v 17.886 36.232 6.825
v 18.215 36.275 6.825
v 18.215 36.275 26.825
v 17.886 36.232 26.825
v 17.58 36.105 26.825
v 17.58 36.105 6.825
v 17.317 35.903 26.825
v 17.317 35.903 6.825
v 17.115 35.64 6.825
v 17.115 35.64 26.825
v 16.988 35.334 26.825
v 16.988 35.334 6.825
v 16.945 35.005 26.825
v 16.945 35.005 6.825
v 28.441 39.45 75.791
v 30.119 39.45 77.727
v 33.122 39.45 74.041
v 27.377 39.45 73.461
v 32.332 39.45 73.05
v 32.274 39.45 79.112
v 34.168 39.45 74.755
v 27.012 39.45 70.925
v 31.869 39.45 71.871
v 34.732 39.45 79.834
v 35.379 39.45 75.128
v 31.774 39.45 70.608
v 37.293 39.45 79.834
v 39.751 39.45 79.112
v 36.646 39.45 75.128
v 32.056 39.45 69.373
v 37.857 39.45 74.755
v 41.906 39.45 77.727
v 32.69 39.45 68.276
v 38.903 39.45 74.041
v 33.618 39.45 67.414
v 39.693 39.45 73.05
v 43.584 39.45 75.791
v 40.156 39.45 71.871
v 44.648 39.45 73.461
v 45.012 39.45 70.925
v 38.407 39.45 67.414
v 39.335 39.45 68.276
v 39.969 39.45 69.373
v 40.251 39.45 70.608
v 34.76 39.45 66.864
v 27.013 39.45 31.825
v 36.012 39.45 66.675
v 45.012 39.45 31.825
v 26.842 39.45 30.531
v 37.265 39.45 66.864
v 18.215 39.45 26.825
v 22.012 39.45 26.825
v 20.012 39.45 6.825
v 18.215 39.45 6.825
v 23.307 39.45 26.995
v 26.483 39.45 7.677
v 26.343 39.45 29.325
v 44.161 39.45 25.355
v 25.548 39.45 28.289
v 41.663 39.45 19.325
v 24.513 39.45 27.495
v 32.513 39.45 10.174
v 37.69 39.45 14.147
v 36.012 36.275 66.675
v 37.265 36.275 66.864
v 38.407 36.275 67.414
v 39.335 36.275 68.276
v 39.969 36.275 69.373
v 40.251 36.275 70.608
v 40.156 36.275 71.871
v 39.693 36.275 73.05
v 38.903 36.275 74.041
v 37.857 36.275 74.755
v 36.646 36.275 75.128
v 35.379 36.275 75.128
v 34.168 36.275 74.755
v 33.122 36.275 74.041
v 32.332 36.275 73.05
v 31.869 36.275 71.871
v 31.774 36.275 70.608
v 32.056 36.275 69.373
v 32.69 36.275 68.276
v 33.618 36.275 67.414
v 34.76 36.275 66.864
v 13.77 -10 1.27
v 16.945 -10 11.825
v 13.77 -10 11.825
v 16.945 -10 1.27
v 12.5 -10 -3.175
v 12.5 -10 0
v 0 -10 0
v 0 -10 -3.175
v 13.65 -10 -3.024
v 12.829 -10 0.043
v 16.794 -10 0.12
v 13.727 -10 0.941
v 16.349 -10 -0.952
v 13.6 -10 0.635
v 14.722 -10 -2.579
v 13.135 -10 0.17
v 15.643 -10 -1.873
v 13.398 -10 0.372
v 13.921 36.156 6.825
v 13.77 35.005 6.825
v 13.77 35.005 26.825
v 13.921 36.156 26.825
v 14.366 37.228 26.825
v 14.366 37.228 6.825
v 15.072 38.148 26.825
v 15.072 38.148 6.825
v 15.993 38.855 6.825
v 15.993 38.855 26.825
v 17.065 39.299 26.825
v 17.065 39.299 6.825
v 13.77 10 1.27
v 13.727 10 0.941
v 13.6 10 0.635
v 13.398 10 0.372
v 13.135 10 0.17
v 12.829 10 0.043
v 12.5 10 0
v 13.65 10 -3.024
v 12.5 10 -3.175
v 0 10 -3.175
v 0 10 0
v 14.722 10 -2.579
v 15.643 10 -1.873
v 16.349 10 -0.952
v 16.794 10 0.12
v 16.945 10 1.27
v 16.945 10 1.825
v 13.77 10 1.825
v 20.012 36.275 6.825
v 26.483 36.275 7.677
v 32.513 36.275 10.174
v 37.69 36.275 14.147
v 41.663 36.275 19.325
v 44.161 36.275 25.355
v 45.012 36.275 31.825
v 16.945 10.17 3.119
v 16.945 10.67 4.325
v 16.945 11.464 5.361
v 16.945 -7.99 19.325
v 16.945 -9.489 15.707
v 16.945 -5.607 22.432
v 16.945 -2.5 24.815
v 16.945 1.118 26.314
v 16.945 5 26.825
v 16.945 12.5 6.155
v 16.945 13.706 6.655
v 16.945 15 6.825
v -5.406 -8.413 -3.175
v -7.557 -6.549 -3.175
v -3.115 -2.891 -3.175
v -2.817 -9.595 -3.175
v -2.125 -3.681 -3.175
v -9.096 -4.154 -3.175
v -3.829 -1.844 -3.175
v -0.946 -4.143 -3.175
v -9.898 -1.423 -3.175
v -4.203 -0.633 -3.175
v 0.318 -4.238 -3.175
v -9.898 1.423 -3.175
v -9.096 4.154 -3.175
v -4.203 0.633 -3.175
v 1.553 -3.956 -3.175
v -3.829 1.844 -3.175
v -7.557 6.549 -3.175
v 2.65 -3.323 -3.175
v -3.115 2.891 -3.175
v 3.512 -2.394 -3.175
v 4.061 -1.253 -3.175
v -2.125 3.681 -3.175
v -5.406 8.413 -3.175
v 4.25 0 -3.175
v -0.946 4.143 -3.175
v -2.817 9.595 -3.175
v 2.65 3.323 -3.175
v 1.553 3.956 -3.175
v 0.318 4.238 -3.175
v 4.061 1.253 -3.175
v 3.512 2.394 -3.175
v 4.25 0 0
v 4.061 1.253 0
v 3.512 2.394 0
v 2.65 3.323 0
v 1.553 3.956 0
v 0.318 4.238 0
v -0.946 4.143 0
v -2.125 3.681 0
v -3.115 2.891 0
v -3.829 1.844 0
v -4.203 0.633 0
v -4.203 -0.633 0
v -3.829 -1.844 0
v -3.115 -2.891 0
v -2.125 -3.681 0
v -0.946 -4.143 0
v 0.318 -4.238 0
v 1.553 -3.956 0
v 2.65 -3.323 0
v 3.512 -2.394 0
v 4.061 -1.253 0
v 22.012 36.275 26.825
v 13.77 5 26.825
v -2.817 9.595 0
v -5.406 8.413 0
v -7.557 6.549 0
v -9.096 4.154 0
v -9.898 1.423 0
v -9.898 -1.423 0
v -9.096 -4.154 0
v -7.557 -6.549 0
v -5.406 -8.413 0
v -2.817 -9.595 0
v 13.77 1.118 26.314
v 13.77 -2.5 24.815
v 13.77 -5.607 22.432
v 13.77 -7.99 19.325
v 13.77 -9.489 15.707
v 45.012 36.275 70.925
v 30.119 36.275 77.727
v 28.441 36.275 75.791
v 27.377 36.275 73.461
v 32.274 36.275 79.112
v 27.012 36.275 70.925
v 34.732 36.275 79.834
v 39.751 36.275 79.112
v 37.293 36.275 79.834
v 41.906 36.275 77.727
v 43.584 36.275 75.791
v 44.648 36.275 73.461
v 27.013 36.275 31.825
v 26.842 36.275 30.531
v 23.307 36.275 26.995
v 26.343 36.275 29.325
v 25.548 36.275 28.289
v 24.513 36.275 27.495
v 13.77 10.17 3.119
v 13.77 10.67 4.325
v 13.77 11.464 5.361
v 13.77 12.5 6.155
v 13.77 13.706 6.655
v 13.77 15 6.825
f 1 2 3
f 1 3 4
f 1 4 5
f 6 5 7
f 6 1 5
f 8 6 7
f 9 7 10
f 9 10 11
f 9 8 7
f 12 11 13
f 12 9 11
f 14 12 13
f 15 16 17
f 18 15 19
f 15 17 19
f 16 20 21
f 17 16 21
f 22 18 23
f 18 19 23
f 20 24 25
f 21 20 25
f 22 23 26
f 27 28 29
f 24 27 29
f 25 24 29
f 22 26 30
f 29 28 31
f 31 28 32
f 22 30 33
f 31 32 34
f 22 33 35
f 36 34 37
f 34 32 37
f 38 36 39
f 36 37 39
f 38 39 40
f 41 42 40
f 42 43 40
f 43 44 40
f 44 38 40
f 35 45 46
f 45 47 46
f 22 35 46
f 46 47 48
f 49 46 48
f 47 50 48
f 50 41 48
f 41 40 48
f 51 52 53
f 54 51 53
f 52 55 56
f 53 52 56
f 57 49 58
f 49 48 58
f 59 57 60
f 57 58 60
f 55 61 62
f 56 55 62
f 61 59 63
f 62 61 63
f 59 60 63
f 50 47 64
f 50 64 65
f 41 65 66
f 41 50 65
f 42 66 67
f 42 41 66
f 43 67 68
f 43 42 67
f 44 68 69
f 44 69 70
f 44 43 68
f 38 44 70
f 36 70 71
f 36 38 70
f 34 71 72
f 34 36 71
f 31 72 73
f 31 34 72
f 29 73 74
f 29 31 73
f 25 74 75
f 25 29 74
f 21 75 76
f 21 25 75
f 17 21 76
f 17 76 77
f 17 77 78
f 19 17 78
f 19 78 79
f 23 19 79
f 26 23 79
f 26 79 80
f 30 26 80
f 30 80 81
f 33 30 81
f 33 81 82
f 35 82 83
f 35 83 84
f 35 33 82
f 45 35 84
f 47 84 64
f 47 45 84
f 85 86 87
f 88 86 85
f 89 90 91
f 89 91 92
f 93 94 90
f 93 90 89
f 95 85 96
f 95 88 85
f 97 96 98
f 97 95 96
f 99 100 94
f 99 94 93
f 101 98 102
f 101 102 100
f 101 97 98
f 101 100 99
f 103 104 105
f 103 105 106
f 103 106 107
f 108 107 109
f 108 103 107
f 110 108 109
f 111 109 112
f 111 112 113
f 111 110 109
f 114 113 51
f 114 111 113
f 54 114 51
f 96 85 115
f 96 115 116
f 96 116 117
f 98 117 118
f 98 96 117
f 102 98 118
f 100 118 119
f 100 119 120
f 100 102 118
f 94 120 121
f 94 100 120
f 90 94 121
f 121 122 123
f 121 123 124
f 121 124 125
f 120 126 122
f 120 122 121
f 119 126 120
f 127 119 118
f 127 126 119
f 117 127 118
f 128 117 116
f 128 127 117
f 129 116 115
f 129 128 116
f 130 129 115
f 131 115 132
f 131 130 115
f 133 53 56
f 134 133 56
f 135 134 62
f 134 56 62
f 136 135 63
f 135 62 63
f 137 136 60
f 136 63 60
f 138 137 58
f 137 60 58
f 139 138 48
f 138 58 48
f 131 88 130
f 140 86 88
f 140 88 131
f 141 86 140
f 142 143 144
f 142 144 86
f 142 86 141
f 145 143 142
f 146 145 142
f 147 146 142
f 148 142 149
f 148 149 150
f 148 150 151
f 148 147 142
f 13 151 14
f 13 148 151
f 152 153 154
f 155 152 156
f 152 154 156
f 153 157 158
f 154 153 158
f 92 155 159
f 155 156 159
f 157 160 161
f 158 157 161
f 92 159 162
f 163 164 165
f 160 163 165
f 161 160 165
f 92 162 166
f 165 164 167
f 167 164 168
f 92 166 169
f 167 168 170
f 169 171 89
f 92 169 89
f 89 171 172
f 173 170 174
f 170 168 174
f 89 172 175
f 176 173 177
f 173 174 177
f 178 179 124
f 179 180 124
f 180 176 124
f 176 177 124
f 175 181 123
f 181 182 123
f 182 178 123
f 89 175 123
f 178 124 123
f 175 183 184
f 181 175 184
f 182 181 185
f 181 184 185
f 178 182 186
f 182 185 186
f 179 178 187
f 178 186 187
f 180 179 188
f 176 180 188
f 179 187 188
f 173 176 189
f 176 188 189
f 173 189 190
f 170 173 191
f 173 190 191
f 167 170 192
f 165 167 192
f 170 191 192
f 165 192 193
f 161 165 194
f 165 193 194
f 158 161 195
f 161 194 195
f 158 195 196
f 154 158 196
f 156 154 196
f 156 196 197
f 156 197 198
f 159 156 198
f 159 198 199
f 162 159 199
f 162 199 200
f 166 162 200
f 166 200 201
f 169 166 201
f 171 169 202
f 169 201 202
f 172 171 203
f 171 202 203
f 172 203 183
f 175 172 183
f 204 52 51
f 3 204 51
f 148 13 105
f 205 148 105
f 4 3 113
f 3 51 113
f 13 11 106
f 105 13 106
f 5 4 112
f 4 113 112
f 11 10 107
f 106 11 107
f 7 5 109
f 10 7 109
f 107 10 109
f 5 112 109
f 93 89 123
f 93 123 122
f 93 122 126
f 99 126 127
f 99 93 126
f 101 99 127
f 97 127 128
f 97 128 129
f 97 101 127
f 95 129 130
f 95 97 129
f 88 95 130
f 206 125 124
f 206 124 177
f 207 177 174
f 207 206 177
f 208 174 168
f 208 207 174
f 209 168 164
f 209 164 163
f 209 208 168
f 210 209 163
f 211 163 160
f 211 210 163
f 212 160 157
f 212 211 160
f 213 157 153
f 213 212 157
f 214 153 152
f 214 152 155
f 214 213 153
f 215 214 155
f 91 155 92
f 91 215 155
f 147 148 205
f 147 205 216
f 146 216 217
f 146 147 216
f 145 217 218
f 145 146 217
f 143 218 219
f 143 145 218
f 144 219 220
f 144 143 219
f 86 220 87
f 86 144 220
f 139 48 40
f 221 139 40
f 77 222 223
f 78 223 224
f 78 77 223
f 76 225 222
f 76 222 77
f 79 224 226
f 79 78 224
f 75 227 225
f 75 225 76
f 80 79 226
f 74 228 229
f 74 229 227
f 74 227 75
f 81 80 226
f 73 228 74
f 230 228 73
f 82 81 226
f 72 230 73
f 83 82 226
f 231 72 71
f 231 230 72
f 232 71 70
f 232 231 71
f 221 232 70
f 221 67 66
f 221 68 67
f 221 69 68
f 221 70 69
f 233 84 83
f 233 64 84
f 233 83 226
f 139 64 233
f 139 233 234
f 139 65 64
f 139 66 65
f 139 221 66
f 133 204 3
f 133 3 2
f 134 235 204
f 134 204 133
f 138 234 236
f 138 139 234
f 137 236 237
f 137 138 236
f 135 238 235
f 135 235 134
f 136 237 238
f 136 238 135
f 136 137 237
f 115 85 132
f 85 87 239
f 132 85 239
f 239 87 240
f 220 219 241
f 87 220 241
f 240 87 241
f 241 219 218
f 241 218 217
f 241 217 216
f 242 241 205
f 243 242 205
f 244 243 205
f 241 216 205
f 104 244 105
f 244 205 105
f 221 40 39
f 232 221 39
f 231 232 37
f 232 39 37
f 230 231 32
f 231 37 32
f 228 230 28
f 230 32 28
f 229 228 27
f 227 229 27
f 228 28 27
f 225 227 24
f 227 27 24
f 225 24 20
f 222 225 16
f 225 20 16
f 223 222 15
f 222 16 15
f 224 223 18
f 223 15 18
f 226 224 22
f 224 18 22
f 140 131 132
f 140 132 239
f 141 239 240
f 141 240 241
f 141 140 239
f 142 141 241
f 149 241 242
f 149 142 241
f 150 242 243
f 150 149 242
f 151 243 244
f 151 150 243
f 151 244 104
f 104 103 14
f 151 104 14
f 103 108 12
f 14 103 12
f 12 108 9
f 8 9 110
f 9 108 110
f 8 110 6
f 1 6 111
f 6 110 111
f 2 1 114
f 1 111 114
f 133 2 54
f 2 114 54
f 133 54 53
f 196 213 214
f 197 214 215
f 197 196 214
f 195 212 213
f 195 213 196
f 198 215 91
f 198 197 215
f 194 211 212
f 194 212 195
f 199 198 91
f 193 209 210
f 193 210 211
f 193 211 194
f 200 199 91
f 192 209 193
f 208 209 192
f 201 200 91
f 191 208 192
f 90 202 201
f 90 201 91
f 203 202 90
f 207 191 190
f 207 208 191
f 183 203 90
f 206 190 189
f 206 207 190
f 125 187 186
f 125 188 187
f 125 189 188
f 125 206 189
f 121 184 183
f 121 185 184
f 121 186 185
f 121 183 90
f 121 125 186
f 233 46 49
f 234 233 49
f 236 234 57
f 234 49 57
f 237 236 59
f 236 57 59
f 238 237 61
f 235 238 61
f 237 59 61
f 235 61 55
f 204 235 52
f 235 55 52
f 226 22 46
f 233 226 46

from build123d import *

# Parameters (mm, degrees)
SKETCH1_R                    = 4.25
BASE_FLANGE1_DEPTH           = 3.175
EDGE_FLANGE1_DEPTH           = 20
EDGE_FLANGE1_START           = 3.175
EDGE_FLANGE1_FLAT_DEPTH      = 3.175
EDGE_FLANGE3_STRIP_W         = 15.24
EDGE_FLANGE3_STRIP_H         = 3.175
EDGE_FLANGE3_STRIP_CUT_DEPTH = 20
EDGE_FLANGE3_DEPTH           = 20
EDGE_FLANGE3_START           = -3.175
EDGE_FLANGE3_PROFILE_R       = 4.25
EDGE_FLANGE3_FLAT_DEPTH      = 3.175


# Sheet-metal steps are written as plain solids
with BuildPart() as part:
    # Sketch1 → Base-Flange1 (new body)
    with BuildSketch(Plane.XY):
        with BuildLine():
            Line((12.5, 10), (0, 10))
            ThreePointArc((0, 10), (-10, 0), (0, -10))
            Line((0, -10), (12.5, -10))
            Line((12.5, -10), (12.5, 10))
        make_face()
        Circle(SKETCH1_R, mode=Mode.SUBTRACT)
    extrude(amount=-BASE_FLANGE1_DEPTH)

    # Edge-Flange1 bend section (across the edge) → Edge-Flange1 (add)
    with BuildSketch(Plane(origin=(13.77, -10, 0), x_dir=(-1, 0, 0), z_dir=(0, 1, 0))):
        with BuildLine():
            Line((-3.175, 1.27), (0, 1.27))
            ThreePointArc((0, 1.27), (0.371974388, 0.371974388), (1.27, 0))
            Line((1.27, 0), (1.27, -3.175))
            ThreePointArc((1.27, -3.175), (-1.873089642, -1.873089642), (-3.175, 1.27))
        make_face()
    extrude(amount=EDGE_FLANGE1_DEPTH)

    # Edge-Flange1 profile (on flange) → Edge-Flange1 flat (add)
    with BuildSketch(Plane.YZ.offset(13.77).offset(EDGE_FLANGE1_START)):
        with BuildLine():
            Line((36.2752, 26.825), (5, 26.825))
            ThreePointArc((5, 26.825), (-5.606601718, 22.431601718), (-10, 11.825))
            Line((-10, 11.825), (-10, 1.27))
            Line((-10, 1.27), (10, 1.27))
            Line((10, 1.27), (10, 1.825))
            ThreePointArc((10, 1.825), (11.464466094, 5.360533906), (15, 6.825))
            Line((15, 6.825), (36.2752, 6.825))
            Line((36.2752, 6.825), (36.2752, 26.825))
        make_face()
    extrude(amount=-EDGE_FLANGE1_FLAT_DEPTH)

    # Edge-Flange3 strip (across the edge) → Edge-Flange3 strip cut (cut)
    with BuildSketch(Plane(origin=(16.945, 36.2752, 6.825), x_dir=(0, -1, 0), z_dir=(0, 0, 1))):
        with Locations((-6.35, -1.5875)):
            Rectangle(EDGE_FLANGE3_STRIP_W, EDGE_FLANGE3_STRIP_H)
    extrude(amount=EDGE_FLANGE3_STRIP_CUT_DEPTH, mode=Mode.SUBTRACT)

    # Edge-Flange3 bend section (across the edge) → Edge-Flange3 (add)
    with BuildSketch(Plane(origin=(16.945, 36.2752, 6.825), x_dir=(0, -1, 0), z_dir=(0, 0, 1))):
        with BuildLine():
            Line((-3.175, 1.27), (0, 1.27))
            ThreePointArc((0, 1.27), (0.371974388, 0.371974388), (1.27, 0))
            Line((1.27, 0), (1.27, -3.175))
            ThreePointArc((1.27, -3.175), (-1.873089642, -1.873089642), (-3.175, 1.27))
        make_face()
    extrude(amount=EDGE_FLANGE3_DEPTH)

    # Edge-Flange3 profile (on flange) → Edge-Flange3 flat (add)
    with BuildSketch(Plane(origin=(16.945, 36.2752, 0), x_dir=(0, 0, -1), z_dir=(0, -1, 0)).offset(EDGE_FLANGE3_START)):
        with BuildLine():
            ThreePointArc((-6.825, 3.0675), (-14.14733047, 20.74516953), (-31.825, 28.0675))
            Line((-31.825, 28.0675), (-70.925400974, 28.0675))
            ThreePointArc((-70.925400974, 28.0675), (-79.925400974, 19.0675), (-70.925400974, 10.0675))
            Line((-70.925400974, 10.0675), (-31.825, 10.0675))
            ThreePointArc((-31.825, 10.0675), (-28.289466094, 8.603033906), (-26.825, 5.0675))
            Line((-26.825, 5.0675), (-26.825, 1.27))
            Line((-26.825, 1.27), (-6.825, 1.27))
            Line((-6.825, 1.27), (-6.825, 3.0675))
        make_face()
        with Locations((-70.925400974, 19.0675)):
            Circle(EDGE_FLANGE3_PROFILE_R, mode=Mode.SUBTRACT)
    extrude(amount=EDGE_FLANGE3_FLAT_DEPTH)


solid = part.part
